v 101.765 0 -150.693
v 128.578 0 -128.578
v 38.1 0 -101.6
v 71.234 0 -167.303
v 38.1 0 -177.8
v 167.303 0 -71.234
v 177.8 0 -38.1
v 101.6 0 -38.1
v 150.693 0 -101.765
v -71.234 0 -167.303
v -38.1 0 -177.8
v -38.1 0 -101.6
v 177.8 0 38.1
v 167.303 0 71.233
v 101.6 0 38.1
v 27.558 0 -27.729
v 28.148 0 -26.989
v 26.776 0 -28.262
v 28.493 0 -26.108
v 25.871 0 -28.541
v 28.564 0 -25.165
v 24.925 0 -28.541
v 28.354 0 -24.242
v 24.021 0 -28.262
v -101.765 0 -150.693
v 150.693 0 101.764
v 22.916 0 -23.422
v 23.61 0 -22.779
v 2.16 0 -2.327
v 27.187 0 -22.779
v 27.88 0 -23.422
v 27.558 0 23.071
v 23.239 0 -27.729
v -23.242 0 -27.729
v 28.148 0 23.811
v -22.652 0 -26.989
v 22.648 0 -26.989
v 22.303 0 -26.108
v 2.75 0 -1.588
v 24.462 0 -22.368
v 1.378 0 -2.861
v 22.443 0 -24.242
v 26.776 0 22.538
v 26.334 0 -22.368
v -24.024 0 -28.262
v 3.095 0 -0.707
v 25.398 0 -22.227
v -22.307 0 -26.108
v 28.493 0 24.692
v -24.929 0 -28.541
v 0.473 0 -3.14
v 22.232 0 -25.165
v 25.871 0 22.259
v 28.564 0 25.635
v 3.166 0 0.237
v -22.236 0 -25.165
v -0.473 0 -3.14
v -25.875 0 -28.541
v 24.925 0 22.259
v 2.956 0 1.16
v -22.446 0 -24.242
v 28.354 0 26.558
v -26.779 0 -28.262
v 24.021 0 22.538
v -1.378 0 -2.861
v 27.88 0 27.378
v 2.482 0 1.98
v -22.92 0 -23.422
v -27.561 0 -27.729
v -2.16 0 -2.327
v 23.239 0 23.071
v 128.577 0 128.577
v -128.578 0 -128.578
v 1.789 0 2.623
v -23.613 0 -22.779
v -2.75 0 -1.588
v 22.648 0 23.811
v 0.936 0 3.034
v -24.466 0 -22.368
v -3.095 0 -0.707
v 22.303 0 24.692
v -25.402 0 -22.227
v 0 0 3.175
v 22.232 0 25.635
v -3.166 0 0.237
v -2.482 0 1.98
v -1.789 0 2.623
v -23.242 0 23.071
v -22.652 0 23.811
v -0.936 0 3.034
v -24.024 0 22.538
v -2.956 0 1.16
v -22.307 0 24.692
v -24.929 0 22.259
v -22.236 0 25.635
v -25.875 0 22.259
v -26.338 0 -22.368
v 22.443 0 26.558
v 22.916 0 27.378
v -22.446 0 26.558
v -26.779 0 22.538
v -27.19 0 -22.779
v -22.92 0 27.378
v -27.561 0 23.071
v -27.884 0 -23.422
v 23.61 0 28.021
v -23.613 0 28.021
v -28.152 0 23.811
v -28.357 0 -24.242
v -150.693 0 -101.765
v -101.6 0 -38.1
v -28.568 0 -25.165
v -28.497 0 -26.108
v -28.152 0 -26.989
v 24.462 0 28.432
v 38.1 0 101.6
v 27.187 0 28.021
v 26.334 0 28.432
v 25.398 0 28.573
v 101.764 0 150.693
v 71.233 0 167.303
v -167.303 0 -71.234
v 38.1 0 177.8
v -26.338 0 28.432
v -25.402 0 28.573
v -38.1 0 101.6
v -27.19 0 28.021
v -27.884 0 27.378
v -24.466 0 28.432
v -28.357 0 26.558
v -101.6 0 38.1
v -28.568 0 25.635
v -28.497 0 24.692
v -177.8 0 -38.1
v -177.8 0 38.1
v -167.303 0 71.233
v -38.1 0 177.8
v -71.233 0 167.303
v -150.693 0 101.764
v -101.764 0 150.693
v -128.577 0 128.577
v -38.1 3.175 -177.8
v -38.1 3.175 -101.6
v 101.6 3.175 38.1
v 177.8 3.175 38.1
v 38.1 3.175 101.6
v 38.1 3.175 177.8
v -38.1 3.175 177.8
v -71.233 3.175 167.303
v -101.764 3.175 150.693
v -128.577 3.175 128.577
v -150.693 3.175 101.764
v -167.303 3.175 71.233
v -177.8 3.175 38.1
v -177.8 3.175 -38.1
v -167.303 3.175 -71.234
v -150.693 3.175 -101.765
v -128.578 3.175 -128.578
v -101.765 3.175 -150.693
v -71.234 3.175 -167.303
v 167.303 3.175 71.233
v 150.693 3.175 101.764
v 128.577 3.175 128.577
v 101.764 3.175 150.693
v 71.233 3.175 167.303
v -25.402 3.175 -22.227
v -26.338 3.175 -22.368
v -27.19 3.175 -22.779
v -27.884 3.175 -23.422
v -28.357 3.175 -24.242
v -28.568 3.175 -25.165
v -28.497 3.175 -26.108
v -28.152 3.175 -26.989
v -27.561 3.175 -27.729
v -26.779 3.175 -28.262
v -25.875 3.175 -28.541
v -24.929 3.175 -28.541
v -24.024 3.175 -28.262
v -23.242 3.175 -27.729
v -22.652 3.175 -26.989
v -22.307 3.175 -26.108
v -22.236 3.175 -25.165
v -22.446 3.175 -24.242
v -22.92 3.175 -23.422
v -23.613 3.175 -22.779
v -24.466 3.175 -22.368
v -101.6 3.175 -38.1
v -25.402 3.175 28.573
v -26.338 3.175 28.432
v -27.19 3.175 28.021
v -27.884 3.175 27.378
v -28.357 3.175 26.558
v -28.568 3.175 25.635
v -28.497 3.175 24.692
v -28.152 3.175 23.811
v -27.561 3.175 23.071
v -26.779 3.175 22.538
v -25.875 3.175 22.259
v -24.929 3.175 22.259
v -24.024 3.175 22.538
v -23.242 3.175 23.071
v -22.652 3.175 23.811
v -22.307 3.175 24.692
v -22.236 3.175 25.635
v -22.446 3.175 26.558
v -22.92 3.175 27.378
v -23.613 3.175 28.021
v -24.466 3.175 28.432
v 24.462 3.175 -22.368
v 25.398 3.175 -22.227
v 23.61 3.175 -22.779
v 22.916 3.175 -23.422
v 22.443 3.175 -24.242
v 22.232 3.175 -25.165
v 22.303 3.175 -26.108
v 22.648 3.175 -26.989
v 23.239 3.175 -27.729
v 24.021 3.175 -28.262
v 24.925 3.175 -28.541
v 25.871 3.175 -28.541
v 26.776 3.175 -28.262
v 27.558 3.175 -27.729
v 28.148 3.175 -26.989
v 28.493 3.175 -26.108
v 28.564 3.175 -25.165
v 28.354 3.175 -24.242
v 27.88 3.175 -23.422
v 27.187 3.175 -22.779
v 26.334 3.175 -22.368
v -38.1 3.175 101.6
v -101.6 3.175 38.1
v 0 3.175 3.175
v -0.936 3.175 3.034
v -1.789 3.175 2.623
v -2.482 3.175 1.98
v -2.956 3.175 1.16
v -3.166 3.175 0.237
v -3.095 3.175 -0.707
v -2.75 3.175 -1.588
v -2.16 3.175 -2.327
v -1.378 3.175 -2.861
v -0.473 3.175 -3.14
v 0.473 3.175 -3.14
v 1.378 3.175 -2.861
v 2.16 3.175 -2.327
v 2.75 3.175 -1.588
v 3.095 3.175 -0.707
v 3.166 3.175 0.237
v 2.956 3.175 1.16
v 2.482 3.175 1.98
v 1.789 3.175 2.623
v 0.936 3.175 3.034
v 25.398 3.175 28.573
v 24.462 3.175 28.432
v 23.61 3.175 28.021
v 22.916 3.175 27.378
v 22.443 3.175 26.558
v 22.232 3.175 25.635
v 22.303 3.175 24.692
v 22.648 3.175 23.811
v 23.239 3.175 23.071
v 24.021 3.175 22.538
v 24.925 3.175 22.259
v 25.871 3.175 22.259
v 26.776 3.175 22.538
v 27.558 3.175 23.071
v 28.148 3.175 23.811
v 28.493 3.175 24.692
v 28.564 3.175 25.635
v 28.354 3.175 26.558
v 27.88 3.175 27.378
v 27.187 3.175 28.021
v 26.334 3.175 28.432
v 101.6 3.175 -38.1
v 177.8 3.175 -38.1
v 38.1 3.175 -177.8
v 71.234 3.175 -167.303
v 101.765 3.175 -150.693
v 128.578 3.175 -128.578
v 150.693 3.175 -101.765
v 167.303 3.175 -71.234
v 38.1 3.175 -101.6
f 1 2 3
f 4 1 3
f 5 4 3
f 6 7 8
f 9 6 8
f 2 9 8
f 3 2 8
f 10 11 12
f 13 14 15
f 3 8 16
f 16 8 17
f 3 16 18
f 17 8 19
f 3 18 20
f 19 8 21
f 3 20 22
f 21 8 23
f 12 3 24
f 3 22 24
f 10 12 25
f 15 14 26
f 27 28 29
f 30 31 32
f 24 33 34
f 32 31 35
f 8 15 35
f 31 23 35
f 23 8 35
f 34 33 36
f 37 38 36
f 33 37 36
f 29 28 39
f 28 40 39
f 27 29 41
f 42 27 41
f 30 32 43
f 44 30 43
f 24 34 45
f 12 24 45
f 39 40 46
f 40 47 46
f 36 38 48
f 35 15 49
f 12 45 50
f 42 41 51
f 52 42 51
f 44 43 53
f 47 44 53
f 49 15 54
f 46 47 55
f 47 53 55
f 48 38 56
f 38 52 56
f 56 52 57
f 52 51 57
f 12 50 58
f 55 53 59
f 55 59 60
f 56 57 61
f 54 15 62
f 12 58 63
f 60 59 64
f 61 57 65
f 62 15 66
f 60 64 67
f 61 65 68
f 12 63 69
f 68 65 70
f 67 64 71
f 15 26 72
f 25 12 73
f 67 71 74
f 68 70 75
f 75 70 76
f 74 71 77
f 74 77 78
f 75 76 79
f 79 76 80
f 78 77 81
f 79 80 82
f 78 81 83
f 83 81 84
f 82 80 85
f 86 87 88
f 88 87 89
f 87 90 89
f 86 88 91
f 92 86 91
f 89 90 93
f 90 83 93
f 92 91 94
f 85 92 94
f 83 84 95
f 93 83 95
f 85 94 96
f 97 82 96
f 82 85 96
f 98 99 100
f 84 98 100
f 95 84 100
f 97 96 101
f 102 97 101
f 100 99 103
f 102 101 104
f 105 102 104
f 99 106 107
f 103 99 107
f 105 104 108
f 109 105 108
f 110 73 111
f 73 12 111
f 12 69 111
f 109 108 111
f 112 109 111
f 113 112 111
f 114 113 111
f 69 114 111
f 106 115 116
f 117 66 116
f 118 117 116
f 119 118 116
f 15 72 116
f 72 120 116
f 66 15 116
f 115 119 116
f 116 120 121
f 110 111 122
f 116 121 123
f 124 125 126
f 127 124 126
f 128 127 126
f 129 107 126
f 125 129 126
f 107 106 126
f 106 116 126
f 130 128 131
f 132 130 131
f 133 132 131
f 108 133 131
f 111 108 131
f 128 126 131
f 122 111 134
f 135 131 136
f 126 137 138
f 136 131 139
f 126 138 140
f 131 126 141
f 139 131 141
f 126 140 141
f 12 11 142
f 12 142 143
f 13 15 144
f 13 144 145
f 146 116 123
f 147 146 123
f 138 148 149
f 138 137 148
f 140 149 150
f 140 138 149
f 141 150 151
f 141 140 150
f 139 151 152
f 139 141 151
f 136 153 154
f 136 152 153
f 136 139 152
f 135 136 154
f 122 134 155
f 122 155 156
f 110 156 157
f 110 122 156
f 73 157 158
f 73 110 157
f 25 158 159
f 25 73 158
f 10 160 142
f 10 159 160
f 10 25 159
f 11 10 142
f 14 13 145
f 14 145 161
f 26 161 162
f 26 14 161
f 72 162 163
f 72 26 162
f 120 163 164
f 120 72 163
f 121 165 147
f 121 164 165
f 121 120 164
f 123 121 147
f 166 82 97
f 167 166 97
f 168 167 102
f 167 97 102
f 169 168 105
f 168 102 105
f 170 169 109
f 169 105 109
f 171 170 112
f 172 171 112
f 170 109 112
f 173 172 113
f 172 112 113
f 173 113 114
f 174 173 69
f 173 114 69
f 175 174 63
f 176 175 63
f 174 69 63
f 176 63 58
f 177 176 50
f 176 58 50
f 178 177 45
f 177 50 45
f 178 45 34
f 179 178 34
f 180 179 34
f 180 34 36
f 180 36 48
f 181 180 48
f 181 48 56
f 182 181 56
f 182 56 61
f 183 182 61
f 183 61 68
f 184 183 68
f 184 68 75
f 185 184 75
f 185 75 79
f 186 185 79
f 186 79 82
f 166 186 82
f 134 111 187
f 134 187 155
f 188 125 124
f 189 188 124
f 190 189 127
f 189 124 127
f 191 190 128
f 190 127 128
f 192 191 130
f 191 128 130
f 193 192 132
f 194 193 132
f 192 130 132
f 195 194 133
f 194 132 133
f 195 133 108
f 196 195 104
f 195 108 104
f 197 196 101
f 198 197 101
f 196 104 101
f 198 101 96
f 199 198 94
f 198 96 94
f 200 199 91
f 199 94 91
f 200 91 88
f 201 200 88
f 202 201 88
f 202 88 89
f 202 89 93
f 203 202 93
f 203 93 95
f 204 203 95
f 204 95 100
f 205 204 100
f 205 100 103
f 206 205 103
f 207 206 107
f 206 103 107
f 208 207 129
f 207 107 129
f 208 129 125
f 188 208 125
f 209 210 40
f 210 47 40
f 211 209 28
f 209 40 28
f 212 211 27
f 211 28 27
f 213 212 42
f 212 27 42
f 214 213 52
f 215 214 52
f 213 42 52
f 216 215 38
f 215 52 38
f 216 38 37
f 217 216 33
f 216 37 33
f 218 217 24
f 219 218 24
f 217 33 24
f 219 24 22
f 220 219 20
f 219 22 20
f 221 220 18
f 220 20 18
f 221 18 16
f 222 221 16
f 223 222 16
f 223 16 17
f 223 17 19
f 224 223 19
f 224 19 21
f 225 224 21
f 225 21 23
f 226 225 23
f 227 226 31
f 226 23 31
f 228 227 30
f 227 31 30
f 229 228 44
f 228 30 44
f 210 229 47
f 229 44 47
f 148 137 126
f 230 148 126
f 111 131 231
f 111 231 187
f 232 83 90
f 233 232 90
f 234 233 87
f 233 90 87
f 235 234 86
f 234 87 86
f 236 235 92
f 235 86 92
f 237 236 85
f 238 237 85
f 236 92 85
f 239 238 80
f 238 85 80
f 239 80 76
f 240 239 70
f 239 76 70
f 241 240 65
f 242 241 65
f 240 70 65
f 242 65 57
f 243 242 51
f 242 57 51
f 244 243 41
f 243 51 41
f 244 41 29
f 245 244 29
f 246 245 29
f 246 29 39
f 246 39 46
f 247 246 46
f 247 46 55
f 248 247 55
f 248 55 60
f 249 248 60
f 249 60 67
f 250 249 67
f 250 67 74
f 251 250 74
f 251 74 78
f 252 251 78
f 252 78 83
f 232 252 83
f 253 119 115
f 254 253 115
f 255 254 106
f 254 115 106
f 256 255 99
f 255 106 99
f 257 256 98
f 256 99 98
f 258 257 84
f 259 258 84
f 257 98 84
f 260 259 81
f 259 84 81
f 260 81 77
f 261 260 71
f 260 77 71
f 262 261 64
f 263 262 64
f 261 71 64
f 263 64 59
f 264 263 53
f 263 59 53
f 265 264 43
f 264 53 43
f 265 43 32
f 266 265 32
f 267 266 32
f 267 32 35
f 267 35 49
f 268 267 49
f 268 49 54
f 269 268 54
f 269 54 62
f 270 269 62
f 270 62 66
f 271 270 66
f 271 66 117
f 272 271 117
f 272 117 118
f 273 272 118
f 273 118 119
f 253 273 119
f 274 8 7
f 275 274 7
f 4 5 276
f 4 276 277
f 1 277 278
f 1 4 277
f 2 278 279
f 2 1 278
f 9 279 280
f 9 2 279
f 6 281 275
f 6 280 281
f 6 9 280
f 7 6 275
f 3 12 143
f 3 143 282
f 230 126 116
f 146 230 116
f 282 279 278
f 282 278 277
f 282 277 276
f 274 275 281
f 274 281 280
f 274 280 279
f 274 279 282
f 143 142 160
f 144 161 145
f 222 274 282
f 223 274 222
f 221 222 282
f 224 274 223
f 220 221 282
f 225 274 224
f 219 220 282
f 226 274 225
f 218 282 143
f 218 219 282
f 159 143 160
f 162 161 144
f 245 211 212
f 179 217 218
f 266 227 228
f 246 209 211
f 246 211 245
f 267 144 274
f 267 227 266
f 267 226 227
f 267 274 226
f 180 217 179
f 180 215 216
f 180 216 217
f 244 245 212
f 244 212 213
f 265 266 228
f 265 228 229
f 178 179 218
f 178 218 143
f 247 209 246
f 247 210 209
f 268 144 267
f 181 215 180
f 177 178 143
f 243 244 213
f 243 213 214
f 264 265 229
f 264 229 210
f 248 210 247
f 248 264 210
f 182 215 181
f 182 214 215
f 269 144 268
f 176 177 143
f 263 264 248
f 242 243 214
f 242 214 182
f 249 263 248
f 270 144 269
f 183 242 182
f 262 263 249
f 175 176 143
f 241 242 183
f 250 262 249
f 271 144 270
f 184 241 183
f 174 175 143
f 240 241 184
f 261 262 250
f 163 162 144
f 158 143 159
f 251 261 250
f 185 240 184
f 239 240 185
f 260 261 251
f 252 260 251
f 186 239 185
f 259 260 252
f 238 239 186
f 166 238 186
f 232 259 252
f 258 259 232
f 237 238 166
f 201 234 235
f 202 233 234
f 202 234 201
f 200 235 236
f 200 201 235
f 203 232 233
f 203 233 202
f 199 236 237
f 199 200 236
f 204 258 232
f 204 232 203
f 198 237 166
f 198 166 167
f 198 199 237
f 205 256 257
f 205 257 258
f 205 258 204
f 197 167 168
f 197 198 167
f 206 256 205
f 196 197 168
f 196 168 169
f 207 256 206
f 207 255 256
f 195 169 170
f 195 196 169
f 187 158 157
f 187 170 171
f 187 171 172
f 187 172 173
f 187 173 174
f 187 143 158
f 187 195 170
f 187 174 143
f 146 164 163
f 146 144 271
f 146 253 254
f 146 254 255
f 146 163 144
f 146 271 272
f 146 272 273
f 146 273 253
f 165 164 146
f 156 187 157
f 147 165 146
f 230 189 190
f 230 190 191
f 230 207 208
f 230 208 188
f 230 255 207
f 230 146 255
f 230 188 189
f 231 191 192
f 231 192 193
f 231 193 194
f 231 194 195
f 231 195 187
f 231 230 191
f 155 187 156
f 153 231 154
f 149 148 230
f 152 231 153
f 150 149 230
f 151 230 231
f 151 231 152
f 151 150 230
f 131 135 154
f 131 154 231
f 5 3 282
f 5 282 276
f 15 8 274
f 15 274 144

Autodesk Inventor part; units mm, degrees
ref_plane "YZ Plane" through (0, 0, 0) normal (1, 0, 0) x (0, 1, 0)
ref_plane "XZ Plane" through (0, 0, 0) normal (0, 1, 0) x (-1, 0, 0)
ref_plane "XY Plane" through (0, 0, 0) normal (0, 0, 1) x (1, 0, 0)
sketch "Sketch1" plane through (0, 0, 0) normal (0, 1, 0) x (-1, 0, 0)
  line L0 (38.1, -177.8) -> (38.1, -101.6)
  line L1 (38.1, -101.6) -> (-38.1, -101.6)
  line L2 (-38.1, -101.6) -> (-38.1, -177.8)
  line L3 (38.1, 177.8) -> (38.1, 101.6)
  line L4 (38.1, 101.6) -> (-38.1, 101.6)
  line L5 (-38.1, 101.6) -> (-38.1, 177.8)
  line L6 (177.8, 38.1) -> (101.6, 38.1)
  line L7 (101.6, 38.1) -> (101.6, -38.1)
  line L8 (101.6, -38.1) -> (177.8, -38.1)
  line L9 (-101.6, -38.1) -> (-177.8, -38.1)
  line L10 (-101.6, -38.1) -> (-101.6, 38.1)
  line L11 (-101.6, 38.1) -> (-177.8, 38.1)
  arc A0 (38.1, -177.8) -> (177.8, -38.1) centre (0, 0) ccw
  arc A1 (-177.8, -38.1) -> (-38.1, -177.8) centre (0, 0) ccw
  arc A2 (177.8, 38.1) -> (38.1, 177.8) centre (-0.0019, -0.0019) ccw
  arc A3 (-38.1, 177.8) -> (-177.8, 38.1) centre (0.0019, -0.0019) ccw
  dimension "d0" = 76.2
  dimension "d2" = 76.2
  dimension "d3" = 76.2
  dimension "d4" = 76.2
  dimension "d5" = 76.2
  dimension "d6" = 76.2
  dimension "d7" = 101.6
  dimension "d8" = 101.6
  dimension "d9" = 38.1
  dimension "d10" = 38.1
  dimension "d11" = 76.2
  dimension "d12" = 76.2
  dimension "d13" = 76.2
  dimension "d14" = 101.6
  dimension "d15" = 38.1
  dimension "d16" = 76.2
  dimension "d17" = 76.2
  dimension "d18" = 76.2
  dimension "d19" = 101.6
  dimension "d20" = 38.1
  dimension "d23" = 0
  dimension "d25" = 0
  dimension "d26" = 181.8363
  dimension "d27" = 181.8363
  dimension "d28" = 181.8386
  dimension "d30" = 181.8386
extrude "Plate1" add sketch "Sketch1" along normal blind 3.175
sketch "Sketch2" plane through (0, 3.175, 0) normal (0, 1, 0) x (1, 0, 0)
  arc A0 (-177.8, -38.1) -> (-38.1, -177.8) centre (0.0019, 0.0019) ccw projected
  arc A1 (38.1, -177.8) -> (177.8, -38.1) centre (-0.0019, 0.0019) ccw projected
  line L0 (-25.4019, -25.3981) -> (25.3981, -25.3981) construction
  line L1 (25.3981, -25.3981) -> (25.3981, 25.4019) construction
  line L2 (25.3981, 25.4019) -> (-25.4019, 25.4019) construction
  line L3 (-25.4019, 25.4019) -> (-25.4019, -25.3981) construction
  dimension "d50" = 50.8
  dimension "d52" = 50.8
  dimension "d53" = 25.4
  dimension "d54" = 25.4
hole "Hole2" at (-25.4019, 3.175, -25.4019) at (25.3981, 3.175, -25.4019) at (25.3981, 3.175, 25.3981) at (-25.4019, 3.175, 25.3981) direction (0, -1, 0) diameter 6.35 depth 3.175
sketch "Sketch3" plane through (0, 3.175, 0) normal (0, 1, 0) x (1, 0, 0)
  arc A0 (177.8, 38.1) -> (38.1, 177.8) centre (0, 0) ccw projected
hole "Hole3" at (0, 3.175, 0) direction (0, -1, 0) diameter 6.35 depth 3.175 tip angle 118
equation "\"d2\" = d0"
equation "\"d3\" = d0"
equation "\"d4\" = d0"
equation "\"d5\" = d6"
equation "\"d8\" = d7"
equation "\"d9\" = 0.5 * d6"
equation "\"d10\" = 0.5 * d6"
equation "\"d11\" = d0"
equation "\"d12\" = d0"
equation "\"d13\" = d6"
equation "\"d14\" = d7"
equation "\"d15\" = 0.5 * d6"
equation "\"d16\" = d6"
equation "\"d17\" = d0"
equation "\"d18\" = d0"
equation "\"d60\" = Thickness"
equation "\"d67\" = Thickness"
equation "\"d19\" = d7"
equation "\"d20\" = 0.5 * d6"
equation "\"BendRadius\" = Thickness"
equation "\"BendReliefWidth\" = Thickness"
equation "\"BendReliefDepth\" = 0.5 * Thickness"
equation "\"CornerReliefSize\" = 4 * Thickness"
equation "\"MinimumRemnant\" = 2 * Thickness"
equation "\"TransitionRadius\" = BendRadius"
equation "\"JacobiRadiusSize\" = BendRadius"
equation "\"GapSize\" = Thickness"
equation "\"d31\" = BendRadius"
equation "\"Thickness\" = 3.175"
properties part number "TopCover"
